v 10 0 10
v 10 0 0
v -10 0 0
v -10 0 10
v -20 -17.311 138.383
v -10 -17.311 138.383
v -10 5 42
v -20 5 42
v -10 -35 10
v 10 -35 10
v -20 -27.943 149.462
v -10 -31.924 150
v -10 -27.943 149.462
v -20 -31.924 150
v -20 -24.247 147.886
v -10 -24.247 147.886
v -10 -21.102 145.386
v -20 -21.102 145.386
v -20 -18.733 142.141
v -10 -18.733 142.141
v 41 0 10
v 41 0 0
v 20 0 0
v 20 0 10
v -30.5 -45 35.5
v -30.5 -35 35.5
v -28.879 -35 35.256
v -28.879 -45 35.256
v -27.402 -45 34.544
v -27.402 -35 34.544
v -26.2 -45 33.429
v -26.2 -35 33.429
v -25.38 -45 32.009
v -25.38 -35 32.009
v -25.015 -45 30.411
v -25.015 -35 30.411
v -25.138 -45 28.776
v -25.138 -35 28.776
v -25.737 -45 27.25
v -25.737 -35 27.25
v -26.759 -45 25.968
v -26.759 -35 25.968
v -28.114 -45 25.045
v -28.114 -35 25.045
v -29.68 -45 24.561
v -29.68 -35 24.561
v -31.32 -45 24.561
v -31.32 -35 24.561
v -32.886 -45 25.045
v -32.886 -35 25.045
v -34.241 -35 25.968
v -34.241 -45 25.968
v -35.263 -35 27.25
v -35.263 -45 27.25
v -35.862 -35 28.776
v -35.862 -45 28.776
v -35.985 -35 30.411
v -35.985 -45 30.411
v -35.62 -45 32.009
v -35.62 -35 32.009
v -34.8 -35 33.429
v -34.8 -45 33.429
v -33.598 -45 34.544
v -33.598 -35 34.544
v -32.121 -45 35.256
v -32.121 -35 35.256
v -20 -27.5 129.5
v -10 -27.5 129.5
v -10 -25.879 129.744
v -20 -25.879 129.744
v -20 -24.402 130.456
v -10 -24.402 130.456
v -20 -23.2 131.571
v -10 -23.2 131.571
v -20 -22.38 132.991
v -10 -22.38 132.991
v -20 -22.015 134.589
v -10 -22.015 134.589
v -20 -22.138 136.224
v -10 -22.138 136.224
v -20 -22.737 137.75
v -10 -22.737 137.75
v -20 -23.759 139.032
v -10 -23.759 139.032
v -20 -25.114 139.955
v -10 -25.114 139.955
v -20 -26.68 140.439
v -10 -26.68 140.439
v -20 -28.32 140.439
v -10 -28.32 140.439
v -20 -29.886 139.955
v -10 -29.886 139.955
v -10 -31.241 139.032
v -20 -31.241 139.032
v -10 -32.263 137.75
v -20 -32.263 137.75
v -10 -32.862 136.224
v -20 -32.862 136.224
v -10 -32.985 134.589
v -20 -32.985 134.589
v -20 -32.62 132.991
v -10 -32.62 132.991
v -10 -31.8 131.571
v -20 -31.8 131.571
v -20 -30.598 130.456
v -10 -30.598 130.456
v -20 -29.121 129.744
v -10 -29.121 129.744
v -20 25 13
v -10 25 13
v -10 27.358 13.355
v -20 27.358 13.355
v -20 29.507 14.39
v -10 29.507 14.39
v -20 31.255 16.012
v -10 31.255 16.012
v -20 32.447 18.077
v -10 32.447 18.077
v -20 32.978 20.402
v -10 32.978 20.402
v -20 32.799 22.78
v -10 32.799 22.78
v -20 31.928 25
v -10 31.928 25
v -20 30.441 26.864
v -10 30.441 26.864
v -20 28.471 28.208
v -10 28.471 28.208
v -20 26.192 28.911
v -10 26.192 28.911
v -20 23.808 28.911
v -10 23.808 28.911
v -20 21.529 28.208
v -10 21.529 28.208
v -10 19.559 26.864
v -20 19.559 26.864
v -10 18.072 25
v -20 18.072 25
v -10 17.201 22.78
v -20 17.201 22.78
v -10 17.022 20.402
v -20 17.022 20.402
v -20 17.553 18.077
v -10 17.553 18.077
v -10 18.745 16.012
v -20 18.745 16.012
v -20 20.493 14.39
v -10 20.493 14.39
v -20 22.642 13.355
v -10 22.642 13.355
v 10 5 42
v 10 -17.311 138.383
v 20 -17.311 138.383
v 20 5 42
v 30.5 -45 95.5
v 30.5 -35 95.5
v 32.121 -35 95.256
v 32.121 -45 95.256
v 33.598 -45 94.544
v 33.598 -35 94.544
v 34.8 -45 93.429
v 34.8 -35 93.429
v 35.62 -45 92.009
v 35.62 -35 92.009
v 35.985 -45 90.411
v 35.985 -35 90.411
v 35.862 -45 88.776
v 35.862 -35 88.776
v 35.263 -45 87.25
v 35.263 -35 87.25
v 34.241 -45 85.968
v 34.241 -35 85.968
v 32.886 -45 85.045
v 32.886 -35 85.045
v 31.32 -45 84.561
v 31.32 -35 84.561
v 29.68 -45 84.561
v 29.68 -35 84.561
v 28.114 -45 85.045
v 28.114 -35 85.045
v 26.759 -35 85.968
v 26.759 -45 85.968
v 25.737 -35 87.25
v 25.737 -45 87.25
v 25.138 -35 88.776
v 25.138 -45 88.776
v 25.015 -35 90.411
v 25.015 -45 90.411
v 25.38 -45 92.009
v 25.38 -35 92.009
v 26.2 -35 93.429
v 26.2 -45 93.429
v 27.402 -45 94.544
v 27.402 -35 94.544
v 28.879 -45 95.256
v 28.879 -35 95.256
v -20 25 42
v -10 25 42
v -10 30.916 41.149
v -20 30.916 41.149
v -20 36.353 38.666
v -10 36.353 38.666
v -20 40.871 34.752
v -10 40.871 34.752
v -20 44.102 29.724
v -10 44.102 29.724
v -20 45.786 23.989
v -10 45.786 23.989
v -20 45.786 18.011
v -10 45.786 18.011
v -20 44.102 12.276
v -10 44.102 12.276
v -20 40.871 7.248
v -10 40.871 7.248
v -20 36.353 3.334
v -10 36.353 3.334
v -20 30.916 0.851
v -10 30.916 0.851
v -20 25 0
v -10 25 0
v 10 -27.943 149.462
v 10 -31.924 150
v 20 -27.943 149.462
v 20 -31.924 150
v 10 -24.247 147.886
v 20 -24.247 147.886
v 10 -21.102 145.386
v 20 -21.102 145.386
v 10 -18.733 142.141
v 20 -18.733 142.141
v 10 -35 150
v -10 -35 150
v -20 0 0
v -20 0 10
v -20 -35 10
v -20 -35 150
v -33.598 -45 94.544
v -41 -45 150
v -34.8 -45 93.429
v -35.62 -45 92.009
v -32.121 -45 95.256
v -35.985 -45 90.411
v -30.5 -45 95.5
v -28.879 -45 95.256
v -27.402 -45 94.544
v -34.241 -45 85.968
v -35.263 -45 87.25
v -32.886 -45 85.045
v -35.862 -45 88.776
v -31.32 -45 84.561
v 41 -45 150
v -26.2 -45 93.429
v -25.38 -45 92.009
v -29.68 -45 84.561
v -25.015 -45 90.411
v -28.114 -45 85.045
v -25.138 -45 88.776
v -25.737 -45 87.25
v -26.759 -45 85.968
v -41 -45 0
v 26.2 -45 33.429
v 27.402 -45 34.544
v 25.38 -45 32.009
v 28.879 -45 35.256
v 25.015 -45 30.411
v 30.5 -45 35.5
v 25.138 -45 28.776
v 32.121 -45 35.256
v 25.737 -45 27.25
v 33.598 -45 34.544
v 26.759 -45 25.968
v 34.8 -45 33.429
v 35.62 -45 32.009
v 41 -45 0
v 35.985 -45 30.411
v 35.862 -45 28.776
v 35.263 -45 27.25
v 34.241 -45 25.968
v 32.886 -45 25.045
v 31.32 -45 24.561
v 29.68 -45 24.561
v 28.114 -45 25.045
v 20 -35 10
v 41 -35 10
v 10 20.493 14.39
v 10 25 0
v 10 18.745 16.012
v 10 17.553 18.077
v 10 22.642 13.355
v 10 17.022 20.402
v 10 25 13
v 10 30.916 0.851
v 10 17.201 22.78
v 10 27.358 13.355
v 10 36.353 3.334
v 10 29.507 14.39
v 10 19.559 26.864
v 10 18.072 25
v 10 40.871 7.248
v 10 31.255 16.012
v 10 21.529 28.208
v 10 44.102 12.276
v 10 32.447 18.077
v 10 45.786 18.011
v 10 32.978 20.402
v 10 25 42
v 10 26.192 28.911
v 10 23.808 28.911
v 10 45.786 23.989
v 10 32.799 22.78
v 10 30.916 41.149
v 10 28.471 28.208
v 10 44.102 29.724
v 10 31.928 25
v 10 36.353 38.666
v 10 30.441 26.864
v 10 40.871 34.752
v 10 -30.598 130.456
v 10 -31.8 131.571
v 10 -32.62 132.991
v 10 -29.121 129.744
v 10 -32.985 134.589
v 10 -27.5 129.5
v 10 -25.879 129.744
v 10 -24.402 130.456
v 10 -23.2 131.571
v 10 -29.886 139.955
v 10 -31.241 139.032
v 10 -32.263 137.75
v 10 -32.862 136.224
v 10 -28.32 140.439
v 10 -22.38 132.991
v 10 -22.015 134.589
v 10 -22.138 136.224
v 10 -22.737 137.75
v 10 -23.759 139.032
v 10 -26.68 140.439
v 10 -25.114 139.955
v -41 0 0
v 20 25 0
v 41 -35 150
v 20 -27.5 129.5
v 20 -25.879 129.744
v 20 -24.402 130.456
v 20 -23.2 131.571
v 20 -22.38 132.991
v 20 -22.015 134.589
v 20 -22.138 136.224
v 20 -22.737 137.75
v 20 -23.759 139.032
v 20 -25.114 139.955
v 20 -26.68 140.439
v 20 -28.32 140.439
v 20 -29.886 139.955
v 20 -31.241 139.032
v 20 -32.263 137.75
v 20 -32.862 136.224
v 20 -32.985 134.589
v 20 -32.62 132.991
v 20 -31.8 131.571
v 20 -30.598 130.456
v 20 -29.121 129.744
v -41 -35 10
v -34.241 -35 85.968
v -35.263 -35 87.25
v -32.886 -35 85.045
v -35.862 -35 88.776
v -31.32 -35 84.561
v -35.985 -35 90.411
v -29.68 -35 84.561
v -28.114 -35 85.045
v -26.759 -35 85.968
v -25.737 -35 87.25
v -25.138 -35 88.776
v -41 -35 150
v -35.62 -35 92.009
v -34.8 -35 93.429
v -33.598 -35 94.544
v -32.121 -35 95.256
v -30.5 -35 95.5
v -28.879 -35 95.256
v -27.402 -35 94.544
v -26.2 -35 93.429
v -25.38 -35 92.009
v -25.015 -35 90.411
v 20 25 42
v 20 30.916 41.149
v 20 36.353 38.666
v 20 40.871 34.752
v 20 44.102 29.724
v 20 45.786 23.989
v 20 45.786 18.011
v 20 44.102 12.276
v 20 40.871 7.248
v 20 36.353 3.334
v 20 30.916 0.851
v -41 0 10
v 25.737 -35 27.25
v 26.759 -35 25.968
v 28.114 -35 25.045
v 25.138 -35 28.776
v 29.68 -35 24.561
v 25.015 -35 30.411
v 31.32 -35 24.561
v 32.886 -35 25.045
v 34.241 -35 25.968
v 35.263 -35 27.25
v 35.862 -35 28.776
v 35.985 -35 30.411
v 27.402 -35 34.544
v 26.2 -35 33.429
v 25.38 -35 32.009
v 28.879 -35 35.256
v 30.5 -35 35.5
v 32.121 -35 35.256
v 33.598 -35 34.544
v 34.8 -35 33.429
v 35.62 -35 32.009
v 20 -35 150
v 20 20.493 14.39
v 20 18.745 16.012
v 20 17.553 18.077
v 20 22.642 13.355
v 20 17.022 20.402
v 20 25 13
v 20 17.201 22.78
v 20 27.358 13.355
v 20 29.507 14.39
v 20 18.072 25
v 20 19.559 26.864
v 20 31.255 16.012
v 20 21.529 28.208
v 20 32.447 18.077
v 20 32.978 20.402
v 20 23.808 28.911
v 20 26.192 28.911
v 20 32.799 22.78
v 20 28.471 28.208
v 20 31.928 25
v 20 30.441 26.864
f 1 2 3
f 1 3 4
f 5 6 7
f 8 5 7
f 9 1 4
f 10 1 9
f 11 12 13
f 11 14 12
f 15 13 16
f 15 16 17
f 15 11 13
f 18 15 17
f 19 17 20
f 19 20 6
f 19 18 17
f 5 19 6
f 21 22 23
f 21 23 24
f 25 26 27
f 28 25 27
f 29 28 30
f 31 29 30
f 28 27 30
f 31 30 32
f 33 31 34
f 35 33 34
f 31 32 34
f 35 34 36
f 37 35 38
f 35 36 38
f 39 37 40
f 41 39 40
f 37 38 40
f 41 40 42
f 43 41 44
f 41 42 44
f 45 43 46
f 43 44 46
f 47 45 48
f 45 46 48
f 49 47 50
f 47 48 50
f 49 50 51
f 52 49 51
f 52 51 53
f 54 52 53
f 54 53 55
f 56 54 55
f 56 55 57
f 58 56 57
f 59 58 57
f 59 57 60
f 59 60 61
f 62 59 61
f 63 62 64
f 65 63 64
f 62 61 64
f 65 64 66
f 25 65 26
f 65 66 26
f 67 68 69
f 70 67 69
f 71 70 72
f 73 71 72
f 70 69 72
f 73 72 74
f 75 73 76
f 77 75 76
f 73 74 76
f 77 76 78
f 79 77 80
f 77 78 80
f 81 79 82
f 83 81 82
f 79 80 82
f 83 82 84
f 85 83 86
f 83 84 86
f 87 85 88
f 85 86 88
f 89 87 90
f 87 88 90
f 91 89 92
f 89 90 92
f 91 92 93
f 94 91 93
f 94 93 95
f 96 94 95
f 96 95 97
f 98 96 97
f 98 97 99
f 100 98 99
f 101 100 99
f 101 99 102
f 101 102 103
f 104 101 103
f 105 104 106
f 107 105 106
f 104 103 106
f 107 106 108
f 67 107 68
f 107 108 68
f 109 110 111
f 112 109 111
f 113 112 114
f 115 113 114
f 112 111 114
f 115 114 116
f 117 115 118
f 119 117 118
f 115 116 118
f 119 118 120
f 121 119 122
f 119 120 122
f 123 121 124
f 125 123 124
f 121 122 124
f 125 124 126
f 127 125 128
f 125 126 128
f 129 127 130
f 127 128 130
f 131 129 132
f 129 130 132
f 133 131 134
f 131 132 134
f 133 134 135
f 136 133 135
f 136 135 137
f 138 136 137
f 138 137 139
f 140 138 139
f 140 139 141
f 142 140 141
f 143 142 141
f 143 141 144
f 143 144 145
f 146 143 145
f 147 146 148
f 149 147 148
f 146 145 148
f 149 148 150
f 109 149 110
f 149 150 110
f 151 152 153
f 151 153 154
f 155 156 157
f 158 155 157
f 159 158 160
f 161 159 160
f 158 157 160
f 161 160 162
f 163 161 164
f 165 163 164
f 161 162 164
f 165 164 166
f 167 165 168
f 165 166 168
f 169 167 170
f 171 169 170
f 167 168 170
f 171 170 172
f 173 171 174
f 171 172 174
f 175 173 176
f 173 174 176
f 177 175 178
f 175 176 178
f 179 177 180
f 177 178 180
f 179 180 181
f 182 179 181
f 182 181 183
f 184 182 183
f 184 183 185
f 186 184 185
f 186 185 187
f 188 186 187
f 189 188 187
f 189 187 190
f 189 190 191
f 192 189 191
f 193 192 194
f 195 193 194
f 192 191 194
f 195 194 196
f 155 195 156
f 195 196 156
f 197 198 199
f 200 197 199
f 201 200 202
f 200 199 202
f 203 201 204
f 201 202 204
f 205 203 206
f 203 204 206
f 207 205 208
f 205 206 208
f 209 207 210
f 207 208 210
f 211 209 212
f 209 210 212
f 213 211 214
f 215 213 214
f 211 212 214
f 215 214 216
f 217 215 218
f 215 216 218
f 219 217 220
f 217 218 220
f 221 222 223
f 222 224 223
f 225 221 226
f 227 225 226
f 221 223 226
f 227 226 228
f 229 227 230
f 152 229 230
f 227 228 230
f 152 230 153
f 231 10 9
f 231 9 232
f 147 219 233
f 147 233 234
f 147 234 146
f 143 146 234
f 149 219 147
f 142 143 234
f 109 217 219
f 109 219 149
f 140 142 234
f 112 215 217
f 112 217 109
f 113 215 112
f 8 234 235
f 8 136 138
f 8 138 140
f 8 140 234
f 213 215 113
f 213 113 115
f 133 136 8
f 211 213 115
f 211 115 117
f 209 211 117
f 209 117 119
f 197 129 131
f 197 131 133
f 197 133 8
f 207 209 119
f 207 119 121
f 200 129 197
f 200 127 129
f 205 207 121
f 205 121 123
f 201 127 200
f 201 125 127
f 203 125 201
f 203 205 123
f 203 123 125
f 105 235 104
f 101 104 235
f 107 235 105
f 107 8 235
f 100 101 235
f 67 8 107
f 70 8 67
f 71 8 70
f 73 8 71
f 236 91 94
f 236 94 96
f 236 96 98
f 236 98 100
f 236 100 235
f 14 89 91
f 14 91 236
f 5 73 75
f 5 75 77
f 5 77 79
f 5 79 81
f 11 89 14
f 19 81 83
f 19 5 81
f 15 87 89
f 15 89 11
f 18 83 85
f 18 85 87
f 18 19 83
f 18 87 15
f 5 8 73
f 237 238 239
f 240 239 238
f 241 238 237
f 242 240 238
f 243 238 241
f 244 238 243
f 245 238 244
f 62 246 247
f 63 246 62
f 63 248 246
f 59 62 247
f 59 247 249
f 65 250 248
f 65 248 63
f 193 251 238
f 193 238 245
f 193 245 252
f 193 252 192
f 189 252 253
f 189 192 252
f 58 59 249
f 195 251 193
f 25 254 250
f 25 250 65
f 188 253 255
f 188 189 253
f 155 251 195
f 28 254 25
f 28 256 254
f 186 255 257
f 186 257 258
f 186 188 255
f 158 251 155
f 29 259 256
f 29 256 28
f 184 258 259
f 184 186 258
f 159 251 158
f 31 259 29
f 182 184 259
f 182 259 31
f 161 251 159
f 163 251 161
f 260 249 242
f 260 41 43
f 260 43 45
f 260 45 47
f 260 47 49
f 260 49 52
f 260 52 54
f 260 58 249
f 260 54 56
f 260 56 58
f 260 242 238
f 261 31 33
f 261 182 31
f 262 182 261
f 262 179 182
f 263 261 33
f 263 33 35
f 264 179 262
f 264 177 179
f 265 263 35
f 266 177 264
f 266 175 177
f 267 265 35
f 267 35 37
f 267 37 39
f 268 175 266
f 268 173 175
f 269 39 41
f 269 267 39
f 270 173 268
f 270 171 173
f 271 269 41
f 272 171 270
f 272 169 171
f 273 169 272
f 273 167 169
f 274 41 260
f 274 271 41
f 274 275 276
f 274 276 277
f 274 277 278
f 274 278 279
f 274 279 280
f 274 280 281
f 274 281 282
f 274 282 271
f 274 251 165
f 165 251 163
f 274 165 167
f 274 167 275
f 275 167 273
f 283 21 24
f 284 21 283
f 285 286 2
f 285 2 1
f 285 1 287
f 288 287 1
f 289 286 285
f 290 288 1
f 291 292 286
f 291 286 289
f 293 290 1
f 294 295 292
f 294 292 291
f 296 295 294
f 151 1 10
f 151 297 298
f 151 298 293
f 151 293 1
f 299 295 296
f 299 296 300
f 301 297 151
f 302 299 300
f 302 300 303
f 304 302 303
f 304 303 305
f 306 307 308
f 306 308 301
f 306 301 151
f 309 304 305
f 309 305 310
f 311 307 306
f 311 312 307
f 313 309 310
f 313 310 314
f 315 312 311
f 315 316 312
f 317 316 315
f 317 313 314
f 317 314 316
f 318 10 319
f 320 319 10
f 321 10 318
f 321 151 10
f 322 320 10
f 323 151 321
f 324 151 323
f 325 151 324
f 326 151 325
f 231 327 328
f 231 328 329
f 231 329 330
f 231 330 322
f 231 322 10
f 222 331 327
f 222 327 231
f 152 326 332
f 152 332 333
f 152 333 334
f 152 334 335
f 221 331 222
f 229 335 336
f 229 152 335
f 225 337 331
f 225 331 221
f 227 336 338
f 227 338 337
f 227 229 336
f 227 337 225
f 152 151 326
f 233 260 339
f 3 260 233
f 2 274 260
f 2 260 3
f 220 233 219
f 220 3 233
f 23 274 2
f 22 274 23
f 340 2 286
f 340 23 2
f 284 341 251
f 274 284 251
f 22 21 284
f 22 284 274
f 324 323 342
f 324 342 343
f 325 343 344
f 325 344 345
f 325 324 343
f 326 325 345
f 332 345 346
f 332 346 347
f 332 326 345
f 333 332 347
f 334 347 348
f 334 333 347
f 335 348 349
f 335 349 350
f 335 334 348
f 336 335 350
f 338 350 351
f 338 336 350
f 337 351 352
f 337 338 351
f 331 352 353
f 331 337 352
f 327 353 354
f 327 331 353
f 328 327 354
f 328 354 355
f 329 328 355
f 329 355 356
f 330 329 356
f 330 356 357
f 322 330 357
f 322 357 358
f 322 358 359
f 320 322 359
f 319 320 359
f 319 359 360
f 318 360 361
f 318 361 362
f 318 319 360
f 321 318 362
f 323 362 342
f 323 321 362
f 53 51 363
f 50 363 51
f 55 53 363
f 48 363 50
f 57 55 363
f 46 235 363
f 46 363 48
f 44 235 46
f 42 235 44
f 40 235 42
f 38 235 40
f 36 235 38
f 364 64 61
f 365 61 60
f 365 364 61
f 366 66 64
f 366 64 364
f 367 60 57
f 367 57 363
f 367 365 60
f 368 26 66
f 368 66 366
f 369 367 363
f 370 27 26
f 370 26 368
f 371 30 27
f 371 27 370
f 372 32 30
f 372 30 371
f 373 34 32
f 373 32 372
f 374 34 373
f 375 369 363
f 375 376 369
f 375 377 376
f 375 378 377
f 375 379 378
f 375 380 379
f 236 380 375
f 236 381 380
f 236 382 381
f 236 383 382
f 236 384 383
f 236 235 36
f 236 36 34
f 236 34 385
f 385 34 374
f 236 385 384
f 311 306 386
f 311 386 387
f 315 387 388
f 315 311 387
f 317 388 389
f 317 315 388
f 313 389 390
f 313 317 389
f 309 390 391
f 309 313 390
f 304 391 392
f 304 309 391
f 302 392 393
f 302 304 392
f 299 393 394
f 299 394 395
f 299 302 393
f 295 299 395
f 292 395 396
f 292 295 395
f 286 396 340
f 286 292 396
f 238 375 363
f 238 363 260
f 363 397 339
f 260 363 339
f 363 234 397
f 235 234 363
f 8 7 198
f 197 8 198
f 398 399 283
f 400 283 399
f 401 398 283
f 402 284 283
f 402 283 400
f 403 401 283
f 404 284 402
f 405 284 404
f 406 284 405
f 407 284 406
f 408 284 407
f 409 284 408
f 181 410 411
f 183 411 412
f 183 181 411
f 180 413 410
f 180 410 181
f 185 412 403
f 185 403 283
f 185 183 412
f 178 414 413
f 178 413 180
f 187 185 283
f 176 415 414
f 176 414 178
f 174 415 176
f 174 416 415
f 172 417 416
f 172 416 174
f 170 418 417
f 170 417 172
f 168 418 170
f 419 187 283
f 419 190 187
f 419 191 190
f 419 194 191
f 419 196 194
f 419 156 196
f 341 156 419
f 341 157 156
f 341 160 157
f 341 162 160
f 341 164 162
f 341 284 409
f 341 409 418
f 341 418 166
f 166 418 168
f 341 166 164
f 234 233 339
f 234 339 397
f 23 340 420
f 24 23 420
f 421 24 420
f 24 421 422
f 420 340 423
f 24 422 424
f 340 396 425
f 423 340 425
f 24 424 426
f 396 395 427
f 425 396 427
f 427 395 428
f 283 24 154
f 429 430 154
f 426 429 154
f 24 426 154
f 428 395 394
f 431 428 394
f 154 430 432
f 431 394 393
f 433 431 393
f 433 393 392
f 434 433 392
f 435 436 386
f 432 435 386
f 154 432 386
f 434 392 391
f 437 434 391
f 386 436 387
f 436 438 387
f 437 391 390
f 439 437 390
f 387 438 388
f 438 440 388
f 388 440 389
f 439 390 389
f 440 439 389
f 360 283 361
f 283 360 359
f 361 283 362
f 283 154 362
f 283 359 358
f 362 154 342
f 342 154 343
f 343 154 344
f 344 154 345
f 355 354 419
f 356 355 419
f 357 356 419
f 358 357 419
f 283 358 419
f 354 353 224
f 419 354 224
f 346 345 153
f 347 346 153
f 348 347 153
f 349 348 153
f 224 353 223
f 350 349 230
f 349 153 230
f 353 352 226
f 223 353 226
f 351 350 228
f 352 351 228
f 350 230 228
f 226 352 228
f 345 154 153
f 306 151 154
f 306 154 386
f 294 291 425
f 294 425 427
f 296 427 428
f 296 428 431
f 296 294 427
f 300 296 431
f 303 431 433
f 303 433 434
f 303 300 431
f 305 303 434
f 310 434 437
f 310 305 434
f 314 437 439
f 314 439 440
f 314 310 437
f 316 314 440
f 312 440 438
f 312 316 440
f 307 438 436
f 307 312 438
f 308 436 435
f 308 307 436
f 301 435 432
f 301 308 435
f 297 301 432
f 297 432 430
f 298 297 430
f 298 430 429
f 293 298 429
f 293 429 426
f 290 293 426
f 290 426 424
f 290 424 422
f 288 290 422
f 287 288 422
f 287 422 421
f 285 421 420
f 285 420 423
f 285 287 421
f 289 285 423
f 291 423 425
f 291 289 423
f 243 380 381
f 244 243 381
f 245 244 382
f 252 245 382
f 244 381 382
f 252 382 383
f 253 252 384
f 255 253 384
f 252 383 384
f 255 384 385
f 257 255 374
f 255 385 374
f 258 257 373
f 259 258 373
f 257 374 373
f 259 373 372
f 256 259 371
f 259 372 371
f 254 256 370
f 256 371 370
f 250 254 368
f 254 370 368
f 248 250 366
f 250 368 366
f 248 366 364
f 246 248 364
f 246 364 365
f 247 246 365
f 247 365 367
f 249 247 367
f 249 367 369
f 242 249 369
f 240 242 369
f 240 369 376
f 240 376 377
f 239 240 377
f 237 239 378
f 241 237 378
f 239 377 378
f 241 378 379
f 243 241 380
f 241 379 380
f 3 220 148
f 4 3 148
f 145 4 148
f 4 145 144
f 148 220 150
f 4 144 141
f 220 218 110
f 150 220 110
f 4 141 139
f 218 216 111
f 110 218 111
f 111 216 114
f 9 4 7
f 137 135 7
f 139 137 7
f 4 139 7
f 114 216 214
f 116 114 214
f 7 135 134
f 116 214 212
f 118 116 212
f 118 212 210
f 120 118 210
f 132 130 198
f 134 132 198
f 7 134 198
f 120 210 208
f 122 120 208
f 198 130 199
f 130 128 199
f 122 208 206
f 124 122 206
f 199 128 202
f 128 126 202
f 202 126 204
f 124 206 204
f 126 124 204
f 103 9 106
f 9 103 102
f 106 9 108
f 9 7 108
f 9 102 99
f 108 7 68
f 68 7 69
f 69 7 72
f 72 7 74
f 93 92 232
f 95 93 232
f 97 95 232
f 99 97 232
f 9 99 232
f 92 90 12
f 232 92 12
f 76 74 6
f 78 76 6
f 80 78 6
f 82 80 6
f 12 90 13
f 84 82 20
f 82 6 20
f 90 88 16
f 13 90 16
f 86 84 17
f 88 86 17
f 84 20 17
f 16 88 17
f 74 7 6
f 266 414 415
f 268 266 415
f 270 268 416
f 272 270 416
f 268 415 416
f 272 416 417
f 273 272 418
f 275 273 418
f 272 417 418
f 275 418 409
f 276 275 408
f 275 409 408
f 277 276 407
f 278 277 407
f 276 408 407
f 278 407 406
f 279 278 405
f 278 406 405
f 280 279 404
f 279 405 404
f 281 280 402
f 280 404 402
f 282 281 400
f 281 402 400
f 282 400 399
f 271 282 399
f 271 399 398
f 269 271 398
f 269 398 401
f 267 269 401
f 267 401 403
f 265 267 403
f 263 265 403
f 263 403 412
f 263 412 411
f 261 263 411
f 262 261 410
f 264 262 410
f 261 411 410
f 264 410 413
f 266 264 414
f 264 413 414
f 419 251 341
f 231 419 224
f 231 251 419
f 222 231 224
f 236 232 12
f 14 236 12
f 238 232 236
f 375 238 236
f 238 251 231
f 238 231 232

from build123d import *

# Parameters (mm, degrees)
BOSS_EXTRUDE1_DEPTH = 41
SKETCH2_R           = 8
SKETCH2_R_2         = 5.5
BOSS_EXTRUDE2_DEPTH = 10
SKETCH3_R           = 5.5
CUT_EXTRUDE1_DEPTH  = 10
FILLET1_R           = 15


with BuildPart() as part:
    # Sketch1 → Boss-Extrude1 (new, symmetric)
    with BuildSketch(Plane(origin=(0, 0, 0), x_dir=(0, 0, -1), z_dir=(1, 0, 0))):
        Polygon((0, 0), (-10, 0), (-10, -35), (-150, -35), (-150, -45), (0, -45), align=None)
    extrude(amount=BOSS_EXTRUDE1_DEPTH, both=True)

    # Sketch2 → Boss-Extrude2 (add)
    with BuildSketch(Plane(origin=(10, 0, 0), x_dir=(0, 0, -1), z_dir=(1, 0, 0))):
        with BuildLine():
            Line((-150, -35), (-150, -20))
            Line((-150, -20), (-42, 5))
            Line((-42, 5), (-42, 25))
            ThreePointArc((-42, 25), (-21, 46), (0, 25))
            Line((0, 25), (0, 0))
            Line((0, 0), (-10, 0))
            Line((-10, 0), (-10, -35))
            Line((-10, -35), (-150, -35))
        make_face()
        with Locations((-21, 25)):
            Circle(SKETCH2_R, mode=Mode.SUBTRACT)
        with Locations((-135, -27.5)):
            Circle(SKETCH2_R_2, mode=Mode.SUBTRACT)
    boss_extrude2 = extrude(amount=BOSS_EXTRUDE2_DEPTH)

    # Mirror1: Boss-Extrude2 across plane
    add(boss_extrude2.mirror(Plane(origin=(0, 0, 0), x_dir=(0, 0, 1), z_dir=(1, 0, 0))))

    # Sketch3 → Cut-Extrude1 (cut)
    with BuildSketch(Plane(origin=(0, -35, 0), x_dir=(1, 0, 0), z_dir=(0, 1, 0))):
        with Locations(Location((30.5, -30, 0), (0, 0, 270))):
            Circle(SKETCH3_R)
        with Locations(Location((30.5, -90, 0), (0, 0, 270))):
            Circle(SKETCH3_R)
        with Locations(Location((-30.5, -90, 0), (0, 0, 270))):
            Circle(SKETCH3_R)
        with Locations(Location((-30.5, -30, 0), (0, 0, 270))):
            Circle(SKETCH3_R)
    extrude(amount=-CUT_EXTRUDE1_DEPTH, mode=Mode.SUBTRACT)

    # Fillet1
    fillet1_edges = [part.edges().sort_by_distance(p)[0] for p in [
        (15, -20, 150),
        (-15, -20, 150),
    ]]
    fillet(fillet1_edges, radius=FILLET1_R)


solid = part.part
